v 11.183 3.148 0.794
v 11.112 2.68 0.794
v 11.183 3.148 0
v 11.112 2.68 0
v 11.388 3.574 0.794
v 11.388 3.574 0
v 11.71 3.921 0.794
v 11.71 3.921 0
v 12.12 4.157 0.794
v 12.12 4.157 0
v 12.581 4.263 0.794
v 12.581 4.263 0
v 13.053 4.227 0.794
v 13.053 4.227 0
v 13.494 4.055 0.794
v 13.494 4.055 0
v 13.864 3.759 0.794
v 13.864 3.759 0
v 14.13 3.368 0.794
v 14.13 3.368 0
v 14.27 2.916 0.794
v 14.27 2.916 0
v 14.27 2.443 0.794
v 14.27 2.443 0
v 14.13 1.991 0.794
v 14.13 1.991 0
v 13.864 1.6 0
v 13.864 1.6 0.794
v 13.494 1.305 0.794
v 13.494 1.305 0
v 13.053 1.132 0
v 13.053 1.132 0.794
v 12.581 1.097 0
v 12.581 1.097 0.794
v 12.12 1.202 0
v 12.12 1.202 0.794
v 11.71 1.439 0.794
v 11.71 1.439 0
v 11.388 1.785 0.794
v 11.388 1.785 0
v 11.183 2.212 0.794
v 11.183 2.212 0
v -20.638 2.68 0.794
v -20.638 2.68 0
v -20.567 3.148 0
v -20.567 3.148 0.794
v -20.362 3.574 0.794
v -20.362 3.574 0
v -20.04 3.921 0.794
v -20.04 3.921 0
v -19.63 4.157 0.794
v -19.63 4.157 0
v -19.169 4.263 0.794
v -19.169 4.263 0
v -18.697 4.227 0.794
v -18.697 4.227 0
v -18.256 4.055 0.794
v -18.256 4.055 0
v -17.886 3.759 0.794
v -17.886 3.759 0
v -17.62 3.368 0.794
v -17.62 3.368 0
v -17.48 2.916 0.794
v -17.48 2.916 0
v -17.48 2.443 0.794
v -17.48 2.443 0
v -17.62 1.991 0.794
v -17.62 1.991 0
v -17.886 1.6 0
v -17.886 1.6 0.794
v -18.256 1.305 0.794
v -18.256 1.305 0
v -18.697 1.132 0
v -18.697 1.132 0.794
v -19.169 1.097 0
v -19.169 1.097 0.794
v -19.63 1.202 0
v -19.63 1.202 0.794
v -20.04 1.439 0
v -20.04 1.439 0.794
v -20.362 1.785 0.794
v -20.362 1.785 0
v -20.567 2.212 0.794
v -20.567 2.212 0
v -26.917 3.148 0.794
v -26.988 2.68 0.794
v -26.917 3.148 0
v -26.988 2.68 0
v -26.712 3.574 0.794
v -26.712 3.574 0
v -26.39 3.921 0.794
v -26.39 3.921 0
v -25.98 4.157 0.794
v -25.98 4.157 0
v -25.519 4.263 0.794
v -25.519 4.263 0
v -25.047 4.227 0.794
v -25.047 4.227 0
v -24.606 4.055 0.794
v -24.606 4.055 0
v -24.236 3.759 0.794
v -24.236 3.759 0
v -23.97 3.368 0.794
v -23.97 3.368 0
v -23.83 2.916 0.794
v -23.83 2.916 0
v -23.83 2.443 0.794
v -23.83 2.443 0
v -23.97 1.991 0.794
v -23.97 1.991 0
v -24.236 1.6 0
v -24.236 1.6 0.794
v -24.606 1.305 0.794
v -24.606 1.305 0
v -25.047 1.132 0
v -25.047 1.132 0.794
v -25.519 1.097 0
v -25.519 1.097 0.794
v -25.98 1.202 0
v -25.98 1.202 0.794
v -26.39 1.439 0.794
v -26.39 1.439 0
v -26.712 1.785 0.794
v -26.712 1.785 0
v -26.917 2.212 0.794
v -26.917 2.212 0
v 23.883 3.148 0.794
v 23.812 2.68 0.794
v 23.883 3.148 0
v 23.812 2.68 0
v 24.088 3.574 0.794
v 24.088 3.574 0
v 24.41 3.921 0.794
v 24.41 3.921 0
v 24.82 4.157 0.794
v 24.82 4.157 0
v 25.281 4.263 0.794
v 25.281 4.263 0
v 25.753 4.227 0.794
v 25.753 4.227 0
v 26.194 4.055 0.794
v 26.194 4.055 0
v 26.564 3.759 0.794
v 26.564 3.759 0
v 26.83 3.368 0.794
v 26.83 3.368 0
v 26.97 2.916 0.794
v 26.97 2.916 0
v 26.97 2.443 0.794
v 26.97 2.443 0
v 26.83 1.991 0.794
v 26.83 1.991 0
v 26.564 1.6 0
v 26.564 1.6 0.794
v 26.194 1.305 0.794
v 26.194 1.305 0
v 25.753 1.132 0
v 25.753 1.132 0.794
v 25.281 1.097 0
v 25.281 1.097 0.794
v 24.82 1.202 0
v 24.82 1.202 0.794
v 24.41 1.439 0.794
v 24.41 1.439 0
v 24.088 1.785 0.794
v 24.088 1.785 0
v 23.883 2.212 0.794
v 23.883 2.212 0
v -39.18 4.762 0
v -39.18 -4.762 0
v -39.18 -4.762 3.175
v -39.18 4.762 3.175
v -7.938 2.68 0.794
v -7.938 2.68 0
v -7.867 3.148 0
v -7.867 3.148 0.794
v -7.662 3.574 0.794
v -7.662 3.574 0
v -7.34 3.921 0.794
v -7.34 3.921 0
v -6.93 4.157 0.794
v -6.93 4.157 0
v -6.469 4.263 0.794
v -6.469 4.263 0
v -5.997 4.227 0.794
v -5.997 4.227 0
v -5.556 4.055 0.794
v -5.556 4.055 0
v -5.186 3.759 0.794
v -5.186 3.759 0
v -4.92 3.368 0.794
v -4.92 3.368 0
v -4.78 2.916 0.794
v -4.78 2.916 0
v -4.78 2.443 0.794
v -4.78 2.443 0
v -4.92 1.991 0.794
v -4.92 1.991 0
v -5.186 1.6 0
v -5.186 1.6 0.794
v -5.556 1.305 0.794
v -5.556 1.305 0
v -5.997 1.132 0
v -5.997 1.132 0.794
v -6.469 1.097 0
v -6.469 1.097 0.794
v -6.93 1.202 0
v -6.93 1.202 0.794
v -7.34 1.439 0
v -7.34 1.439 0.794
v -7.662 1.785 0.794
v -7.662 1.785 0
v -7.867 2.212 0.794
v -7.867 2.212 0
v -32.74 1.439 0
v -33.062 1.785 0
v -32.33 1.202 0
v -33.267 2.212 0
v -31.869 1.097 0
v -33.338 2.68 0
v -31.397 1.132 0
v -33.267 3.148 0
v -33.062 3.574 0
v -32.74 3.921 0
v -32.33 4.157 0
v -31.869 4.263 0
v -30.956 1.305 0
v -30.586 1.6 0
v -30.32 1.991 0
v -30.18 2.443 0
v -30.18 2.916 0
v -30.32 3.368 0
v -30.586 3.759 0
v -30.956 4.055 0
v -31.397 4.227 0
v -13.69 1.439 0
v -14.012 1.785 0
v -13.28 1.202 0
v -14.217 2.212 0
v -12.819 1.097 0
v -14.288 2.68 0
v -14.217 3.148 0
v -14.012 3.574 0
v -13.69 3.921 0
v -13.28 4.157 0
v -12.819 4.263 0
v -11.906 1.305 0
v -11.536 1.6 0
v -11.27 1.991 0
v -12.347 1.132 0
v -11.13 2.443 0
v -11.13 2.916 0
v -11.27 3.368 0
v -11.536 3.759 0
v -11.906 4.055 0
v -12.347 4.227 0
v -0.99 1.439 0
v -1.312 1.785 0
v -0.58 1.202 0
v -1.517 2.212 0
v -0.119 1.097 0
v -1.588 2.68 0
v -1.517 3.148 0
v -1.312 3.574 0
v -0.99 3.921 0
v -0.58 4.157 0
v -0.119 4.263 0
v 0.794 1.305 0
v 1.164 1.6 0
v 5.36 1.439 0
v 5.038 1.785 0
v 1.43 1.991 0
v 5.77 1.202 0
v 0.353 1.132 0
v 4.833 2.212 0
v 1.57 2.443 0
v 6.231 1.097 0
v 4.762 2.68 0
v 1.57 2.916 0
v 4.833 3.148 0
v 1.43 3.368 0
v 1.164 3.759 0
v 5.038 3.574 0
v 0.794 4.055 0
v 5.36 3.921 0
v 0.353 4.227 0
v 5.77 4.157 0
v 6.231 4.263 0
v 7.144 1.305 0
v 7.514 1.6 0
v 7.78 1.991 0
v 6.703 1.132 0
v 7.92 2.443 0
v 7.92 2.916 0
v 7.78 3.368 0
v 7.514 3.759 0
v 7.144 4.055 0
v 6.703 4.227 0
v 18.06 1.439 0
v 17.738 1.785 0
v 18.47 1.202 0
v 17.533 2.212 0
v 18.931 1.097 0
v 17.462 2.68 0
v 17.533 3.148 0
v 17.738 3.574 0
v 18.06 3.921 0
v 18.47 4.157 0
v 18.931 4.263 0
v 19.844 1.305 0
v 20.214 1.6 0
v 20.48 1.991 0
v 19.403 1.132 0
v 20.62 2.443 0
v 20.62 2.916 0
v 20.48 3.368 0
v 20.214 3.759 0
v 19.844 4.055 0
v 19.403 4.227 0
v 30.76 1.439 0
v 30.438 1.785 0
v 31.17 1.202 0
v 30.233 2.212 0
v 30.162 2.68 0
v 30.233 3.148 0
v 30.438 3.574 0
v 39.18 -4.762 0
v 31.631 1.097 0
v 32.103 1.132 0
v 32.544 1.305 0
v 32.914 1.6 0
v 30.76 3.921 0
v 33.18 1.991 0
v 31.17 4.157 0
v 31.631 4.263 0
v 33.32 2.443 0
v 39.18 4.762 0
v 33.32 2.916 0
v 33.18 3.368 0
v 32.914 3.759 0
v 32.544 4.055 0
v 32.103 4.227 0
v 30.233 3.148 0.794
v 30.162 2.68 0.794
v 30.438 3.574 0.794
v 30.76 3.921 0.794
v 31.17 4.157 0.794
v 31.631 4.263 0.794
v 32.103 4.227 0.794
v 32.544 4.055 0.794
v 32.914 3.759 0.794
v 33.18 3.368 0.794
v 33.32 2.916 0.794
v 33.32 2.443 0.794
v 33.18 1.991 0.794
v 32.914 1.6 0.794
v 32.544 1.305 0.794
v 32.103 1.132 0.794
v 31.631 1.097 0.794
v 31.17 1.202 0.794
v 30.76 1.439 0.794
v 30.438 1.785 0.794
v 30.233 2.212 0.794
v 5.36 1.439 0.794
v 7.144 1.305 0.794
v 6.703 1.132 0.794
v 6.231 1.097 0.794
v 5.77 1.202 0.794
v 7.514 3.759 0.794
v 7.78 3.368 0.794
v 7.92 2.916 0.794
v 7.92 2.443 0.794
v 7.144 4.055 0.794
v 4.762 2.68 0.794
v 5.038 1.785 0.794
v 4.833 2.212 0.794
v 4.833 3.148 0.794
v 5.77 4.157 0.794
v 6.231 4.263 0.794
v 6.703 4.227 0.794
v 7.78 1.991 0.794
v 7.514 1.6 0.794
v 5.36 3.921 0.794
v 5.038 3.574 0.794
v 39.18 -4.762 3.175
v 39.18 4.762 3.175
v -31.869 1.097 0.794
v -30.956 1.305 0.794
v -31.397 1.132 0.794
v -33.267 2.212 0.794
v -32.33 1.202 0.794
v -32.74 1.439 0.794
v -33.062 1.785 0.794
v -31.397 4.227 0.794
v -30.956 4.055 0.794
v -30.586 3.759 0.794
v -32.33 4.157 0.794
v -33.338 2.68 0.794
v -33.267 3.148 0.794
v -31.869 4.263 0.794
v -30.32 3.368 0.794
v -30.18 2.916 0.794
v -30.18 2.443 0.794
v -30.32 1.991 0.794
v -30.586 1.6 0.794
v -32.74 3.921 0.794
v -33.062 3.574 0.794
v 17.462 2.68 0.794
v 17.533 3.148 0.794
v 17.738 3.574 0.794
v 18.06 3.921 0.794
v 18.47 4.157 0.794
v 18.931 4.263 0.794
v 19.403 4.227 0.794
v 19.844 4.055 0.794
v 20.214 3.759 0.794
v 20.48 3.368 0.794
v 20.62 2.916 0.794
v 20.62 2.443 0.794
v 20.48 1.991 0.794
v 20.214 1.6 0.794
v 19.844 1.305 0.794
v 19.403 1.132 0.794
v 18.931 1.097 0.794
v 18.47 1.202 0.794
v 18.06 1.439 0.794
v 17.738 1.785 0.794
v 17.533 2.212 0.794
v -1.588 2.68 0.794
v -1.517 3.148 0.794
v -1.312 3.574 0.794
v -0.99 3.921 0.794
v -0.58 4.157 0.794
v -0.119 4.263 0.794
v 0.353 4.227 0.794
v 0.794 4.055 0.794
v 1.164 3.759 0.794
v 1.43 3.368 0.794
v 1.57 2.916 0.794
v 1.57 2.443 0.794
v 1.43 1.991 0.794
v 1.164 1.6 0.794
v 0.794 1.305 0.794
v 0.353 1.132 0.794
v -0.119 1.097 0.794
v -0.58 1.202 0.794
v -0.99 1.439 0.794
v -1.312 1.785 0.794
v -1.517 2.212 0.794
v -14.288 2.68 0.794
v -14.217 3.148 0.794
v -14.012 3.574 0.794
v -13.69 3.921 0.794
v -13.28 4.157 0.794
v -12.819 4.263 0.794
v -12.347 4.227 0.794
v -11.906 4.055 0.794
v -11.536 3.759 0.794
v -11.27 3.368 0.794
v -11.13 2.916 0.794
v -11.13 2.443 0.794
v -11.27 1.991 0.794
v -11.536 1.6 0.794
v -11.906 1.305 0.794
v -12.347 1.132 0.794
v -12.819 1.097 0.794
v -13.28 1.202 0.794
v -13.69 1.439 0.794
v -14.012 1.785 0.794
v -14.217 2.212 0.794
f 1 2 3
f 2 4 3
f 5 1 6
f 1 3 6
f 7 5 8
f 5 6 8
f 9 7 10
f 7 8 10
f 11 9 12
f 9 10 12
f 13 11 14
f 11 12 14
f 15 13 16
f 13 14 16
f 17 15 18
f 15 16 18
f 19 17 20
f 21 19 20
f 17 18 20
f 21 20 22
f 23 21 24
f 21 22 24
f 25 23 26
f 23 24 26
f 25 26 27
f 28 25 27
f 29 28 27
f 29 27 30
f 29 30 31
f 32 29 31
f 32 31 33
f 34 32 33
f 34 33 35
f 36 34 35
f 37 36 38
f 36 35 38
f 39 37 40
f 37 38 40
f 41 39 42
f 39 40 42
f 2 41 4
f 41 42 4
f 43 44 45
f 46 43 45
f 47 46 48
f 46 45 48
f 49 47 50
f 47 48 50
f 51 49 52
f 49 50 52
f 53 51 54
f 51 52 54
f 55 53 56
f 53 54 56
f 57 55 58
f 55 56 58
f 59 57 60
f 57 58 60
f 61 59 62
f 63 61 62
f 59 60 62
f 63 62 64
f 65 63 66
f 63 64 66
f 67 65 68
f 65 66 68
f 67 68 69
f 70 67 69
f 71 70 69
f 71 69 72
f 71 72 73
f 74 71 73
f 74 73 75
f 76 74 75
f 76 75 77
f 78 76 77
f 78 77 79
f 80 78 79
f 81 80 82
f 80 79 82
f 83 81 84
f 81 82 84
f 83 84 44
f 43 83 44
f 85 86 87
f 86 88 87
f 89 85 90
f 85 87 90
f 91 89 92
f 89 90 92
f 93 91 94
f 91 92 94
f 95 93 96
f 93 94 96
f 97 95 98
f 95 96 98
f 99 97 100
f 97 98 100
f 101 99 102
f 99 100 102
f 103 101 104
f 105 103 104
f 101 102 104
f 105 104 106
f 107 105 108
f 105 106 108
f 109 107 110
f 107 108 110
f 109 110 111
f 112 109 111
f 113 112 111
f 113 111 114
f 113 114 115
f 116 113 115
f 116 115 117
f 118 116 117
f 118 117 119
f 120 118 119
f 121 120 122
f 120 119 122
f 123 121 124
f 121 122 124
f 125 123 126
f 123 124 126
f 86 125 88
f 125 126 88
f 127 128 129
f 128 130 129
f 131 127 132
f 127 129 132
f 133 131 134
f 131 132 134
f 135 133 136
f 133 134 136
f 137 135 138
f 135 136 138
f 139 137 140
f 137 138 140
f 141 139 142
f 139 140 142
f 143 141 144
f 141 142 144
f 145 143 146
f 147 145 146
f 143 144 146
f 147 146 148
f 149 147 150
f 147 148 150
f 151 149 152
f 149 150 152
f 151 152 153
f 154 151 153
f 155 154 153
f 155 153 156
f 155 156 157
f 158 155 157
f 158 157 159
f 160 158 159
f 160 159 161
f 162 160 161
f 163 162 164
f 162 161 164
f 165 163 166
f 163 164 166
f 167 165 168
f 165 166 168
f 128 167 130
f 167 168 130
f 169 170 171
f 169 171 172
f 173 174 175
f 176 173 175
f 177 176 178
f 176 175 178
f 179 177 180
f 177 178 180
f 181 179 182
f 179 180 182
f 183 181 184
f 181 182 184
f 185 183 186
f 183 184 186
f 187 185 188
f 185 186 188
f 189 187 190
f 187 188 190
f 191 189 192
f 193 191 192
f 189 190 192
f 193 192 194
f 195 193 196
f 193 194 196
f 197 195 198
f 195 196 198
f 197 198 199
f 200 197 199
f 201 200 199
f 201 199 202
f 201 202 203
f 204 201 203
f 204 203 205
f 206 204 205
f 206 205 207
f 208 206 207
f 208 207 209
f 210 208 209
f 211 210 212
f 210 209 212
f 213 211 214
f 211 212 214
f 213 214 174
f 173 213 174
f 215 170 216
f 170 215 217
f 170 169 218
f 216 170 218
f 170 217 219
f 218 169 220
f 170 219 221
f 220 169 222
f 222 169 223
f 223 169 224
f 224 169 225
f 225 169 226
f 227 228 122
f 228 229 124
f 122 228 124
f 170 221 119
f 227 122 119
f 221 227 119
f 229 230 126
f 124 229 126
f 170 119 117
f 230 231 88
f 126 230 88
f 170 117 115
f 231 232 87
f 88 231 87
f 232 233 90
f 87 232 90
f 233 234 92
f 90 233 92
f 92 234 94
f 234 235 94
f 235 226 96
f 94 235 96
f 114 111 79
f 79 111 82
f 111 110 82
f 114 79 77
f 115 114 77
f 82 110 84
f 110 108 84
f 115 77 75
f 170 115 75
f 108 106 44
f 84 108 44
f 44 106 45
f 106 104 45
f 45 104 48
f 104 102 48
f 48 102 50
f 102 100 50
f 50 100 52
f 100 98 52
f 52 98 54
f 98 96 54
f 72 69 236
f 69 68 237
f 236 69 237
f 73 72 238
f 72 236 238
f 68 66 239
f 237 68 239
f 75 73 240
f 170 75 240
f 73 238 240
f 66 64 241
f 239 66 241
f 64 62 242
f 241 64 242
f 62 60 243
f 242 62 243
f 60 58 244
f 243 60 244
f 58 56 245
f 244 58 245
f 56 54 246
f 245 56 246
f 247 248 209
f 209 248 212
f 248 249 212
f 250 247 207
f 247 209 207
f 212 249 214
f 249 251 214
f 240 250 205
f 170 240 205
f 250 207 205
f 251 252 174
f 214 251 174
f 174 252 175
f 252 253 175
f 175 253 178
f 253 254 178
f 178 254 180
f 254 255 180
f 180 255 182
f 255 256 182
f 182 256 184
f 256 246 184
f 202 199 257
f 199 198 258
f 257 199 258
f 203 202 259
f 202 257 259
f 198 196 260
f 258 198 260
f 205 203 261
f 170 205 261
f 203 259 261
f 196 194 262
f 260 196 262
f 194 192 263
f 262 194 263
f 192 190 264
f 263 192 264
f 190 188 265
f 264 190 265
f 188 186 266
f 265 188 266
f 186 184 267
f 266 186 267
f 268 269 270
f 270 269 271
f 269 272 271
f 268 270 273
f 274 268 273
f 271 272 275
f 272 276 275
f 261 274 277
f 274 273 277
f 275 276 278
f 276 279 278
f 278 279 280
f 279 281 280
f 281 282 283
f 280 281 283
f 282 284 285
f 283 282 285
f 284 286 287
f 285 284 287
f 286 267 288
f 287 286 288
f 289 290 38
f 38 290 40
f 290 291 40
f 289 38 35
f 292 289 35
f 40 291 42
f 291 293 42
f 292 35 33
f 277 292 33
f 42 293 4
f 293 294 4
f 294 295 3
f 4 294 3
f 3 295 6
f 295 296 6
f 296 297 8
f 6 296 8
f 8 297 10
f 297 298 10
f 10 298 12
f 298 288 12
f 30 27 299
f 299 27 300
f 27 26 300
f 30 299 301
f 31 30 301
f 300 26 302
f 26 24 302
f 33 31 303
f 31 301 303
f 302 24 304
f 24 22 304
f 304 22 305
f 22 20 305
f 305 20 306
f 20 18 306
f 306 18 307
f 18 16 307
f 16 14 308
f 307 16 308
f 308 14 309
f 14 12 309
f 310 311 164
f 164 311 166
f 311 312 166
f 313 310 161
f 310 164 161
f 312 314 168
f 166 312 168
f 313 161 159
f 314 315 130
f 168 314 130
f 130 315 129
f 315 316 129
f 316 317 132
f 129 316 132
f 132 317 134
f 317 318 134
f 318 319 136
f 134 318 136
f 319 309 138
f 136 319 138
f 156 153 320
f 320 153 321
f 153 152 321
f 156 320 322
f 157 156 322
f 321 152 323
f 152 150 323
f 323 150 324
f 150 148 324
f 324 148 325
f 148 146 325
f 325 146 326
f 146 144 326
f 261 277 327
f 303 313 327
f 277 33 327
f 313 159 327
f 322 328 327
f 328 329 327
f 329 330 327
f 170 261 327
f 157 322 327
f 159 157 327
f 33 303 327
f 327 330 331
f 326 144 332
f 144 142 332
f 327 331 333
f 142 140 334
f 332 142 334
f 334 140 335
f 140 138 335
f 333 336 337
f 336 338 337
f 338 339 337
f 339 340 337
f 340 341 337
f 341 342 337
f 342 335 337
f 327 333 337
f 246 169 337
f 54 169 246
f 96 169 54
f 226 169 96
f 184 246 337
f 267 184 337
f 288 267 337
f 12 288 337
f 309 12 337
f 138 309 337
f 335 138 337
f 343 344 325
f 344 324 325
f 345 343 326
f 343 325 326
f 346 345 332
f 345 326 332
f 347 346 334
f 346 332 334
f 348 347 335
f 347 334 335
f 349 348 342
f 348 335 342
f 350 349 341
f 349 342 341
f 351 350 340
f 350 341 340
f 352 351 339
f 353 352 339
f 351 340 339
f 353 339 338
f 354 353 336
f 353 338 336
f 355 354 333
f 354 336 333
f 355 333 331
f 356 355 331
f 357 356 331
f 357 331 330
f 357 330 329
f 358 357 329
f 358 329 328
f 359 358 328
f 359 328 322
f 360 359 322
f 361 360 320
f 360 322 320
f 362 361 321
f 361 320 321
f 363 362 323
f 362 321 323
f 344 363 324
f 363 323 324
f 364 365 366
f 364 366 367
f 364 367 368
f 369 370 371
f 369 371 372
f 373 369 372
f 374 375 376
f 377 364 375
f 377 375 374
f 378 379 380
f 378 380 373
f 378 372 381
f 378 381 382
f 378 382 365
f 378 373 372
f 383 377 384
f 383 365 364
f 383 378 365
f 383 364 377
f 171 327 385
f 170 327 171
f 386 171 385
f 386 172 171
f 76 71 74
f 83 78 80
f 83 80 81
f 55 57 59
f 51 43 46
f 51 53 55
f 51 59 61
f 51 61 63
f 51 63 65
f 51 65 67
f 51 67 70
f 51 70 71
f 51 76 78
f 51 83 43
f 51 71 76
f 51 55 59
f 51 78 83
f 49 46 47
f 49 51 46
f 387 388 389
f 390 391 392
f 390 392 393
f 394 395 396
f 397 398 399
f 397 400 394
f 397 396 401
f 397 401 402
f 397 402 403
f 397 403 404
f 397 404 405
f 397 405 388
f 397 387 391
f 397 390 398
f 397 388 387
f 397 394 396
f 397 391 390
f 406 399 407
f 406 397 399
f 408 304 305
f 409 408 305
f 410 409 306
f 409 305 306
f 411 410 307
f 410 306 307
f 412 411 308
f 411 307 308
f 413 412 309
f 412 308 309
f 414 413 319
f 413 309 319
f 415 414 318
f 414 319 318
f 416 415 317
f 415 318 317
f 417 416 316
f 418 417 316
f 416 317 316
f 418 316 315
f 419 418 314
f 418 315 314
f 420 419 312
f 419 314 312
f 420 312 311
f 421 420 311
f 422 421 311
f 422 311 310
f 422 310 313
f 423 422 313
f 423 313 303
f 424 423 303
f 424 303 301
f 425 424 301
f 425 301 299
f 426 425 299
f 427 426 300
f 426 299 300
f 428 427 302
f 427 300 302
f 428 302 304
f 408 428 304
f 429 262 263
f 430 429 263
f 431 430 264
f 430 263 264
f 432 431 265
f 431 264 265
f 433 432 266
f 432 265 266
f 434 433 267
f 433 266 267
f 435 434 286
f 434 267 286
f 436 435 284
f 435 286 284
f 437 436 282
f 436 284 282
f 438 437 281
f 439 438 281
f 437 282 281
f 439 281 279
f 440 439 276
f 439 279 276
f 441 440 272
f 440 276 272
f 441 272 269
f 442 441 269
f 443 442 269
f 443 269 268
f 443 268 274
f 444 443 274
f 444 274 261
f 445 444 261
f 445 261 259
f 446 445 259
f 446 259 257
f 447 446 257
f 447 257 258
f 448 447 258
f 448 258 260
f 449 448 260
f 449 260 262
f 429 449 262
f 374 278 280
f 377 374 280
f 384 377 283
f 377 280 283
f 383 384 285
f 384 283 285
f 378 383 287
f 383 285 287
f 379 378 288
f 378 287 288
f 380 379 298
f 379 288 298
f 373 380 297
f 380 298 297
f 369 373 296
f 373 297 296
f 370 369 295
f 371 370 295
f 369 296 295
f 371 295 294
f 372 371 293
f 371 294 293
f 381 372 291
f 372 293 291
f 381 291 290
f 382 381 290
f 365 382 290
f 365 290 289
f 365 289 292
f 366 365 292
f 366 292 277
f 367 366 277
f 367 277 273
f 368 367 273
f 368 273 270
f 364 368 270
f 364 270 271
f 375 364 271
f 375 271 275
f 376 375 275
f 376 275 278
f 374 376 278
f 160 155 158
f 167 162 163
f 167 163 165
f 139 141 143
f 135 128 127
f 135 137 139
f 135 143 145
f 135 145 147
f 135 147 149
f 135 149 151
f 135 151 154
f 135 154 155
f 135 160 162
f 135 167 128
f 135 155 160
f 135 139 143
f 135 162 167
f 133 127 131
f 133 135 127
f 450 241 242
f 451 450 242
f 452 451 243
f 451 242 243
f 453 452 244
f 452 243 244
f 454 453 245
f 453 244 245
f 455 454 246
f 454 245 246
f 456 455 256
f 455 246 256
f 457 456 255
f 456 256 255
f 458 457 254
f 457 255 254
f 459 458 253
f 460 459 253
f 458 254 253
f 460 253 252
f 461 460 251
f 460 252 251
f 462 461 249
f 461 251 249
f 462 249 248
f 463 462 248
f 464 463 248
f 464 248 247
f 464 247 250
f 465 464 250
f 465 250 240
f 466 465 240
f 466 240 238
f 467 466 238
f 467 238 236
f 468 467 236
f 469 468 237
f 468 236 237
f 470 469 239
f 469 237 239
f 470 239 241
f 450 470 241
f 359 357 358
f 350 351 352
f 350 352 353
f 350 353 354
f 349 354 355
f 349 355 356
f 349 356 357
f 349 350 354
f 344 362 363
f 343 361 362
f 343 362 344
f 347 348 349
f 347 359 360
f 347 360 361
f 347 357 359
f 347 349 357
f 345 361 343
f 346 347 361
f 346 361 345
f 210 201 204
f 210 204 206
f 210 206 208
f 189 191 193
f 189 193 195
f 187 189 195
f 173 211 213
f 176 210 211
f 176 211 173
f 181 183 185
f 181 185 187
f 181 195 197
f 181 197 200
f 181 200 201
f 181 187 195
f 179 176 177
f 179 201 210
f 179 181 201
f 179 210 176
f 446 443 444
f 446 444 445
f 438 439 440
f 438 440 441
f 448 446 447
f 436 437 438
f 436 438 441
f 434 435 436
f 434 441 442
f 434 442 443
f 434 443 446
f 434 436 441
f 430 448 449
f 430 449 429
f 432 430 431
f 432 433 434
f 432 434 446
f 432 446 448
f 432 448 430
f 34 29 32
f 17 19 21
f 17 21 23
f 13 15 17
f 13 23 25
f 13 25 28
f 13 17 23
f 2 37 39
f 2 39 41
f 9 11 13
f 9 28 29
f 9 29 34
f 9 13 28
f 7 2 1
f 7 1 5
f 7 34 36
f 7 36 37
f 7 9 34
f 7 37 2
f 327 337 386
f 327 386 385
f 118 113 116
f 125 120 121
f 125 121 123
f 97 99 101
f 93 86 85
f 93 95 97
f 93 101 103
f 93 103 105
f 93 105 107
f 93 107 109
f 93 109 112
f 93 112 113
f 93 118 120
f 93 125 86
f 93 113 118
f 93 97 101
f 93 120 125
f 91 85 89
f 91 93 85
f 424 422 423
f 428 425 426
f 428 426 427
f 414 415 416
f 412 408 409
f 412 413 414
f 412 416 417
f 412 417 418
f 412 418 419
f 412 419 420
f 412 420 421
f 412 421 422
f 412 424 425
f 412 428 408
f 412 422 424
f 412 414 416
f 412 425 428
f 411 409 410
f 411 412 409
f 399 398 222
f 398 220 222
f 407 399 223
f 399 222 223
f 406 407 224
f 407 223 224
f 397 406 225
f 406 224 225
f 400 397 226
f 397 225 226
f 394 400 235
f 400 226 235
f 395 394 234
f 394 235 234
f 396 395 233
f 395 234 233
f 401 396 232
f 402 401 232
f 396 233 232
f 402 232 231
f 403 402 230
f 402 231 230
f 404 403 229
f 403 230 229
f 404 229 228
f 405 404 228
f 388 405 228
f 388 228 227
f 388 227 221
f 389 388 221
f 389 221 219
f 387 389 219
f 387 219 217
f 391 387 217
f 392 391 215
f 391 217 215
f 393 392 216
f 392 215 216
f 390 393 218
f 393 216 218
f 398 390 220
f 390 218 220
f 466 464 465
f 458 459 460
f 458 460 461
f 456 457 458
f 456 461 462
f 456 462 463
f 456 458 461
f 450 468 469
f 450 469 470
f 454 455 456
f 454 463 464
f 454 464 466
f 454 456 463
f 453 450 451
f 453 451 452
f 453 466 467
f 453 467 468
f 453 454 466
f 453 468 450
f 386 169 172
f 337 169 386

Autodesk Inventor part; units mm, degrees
ref_plane "YZ Plane" through (0, 0, 0) normal (1, 0, 0) x (0, 1, 0)
ref_plane "XZ Plane" through (0, 0, 0) normal (0, 1, 0) x (-1, 0, 0)
ref_plane "XY Plane" through (0, 0, 0) normal (0, 0, 1) x (1, 0, 0)
sketch "Sketch1" plane through (0, 0, 0) normal (0, 0, 1) x (1, 0, 0)
  line L0 (-39.1795, 4.7625) -> (39.1795, 4.7625)
  line L1 (39.1795, 4.7625) -> (39.1795, -4.7625)
  line L2 (39.1795, -4.7625) -> (-39.1795, -4.7625)
  line L3 (-39.1795, -4.7625) -> (-39.1795, 4.7625)
  line L4 (-39.1795, 4.7625) -> (39.1795, -4.7625) construction
  line L5 (39.1795, 4.7625) -> (-39.1795, -4.7625) construction
  point P0 (0, 0)
  dimension "d0" = 78.359
  dimension "d1" = 9.525
extrude "Extrusion1" add sketch "Sketch1" along normal blind 3.175
sketch "Sketch2" plane through (0, 0, 0) normal (0, 0, -1) x (-1, 0, 0)
  line L0 (-54.8513, 0) -> (54.8513, 0) projected
  line L1 (0, -6.6675) -> (0, 6.6675) projected
  line L2 (39.1795, -4.7625) -> (-39.1795, -4.7625) projected
  line L3 (39.1795, 4.7625) -> (39.1795, -4.7625) projected
  line L4 (-39.1795, 4.7625) -> (39.1795, 4.7625) projected
  line L5 (-39.1795, -4.7625) -> (-39.1795, 4.7625) projected
  circle A0 centre (0, 2.6797) radius 1.5875
  point P0 (0, 0)
  dimension "d4" = 3.175
  dimension "d5" = 2.0828
extrude "Extrusion2" cut sketch "Sketch2" against normal blind 0.7937 contours A0 L1 | L1 A0
pattern_linear "Rectangular Pattern1" count 11 spacing 6.35 along (1, 0, 0) of "Extrusion2" first direction both ways yes
equation "\"BendRadius\" = Thickness"
equation "\"BendReliefWidth\" = Thickness"
equation "\"BendReliefDepth\" = 0.5 * Thickness"
equation "\"CornerReliefSize\" = 4 * Thickness"
equation "\"MinimumRemnant\" = 2 * Thickness"
equation "\"TransitionRadius\" = BendRadius"
equation "\"JacobiRadiusSize\" = BendRadius"
equation "\"GapSize\" = Thickness"
equation "\"Thickness\" = 3.048"
properties part number "PrintHeadLoadPlate"
